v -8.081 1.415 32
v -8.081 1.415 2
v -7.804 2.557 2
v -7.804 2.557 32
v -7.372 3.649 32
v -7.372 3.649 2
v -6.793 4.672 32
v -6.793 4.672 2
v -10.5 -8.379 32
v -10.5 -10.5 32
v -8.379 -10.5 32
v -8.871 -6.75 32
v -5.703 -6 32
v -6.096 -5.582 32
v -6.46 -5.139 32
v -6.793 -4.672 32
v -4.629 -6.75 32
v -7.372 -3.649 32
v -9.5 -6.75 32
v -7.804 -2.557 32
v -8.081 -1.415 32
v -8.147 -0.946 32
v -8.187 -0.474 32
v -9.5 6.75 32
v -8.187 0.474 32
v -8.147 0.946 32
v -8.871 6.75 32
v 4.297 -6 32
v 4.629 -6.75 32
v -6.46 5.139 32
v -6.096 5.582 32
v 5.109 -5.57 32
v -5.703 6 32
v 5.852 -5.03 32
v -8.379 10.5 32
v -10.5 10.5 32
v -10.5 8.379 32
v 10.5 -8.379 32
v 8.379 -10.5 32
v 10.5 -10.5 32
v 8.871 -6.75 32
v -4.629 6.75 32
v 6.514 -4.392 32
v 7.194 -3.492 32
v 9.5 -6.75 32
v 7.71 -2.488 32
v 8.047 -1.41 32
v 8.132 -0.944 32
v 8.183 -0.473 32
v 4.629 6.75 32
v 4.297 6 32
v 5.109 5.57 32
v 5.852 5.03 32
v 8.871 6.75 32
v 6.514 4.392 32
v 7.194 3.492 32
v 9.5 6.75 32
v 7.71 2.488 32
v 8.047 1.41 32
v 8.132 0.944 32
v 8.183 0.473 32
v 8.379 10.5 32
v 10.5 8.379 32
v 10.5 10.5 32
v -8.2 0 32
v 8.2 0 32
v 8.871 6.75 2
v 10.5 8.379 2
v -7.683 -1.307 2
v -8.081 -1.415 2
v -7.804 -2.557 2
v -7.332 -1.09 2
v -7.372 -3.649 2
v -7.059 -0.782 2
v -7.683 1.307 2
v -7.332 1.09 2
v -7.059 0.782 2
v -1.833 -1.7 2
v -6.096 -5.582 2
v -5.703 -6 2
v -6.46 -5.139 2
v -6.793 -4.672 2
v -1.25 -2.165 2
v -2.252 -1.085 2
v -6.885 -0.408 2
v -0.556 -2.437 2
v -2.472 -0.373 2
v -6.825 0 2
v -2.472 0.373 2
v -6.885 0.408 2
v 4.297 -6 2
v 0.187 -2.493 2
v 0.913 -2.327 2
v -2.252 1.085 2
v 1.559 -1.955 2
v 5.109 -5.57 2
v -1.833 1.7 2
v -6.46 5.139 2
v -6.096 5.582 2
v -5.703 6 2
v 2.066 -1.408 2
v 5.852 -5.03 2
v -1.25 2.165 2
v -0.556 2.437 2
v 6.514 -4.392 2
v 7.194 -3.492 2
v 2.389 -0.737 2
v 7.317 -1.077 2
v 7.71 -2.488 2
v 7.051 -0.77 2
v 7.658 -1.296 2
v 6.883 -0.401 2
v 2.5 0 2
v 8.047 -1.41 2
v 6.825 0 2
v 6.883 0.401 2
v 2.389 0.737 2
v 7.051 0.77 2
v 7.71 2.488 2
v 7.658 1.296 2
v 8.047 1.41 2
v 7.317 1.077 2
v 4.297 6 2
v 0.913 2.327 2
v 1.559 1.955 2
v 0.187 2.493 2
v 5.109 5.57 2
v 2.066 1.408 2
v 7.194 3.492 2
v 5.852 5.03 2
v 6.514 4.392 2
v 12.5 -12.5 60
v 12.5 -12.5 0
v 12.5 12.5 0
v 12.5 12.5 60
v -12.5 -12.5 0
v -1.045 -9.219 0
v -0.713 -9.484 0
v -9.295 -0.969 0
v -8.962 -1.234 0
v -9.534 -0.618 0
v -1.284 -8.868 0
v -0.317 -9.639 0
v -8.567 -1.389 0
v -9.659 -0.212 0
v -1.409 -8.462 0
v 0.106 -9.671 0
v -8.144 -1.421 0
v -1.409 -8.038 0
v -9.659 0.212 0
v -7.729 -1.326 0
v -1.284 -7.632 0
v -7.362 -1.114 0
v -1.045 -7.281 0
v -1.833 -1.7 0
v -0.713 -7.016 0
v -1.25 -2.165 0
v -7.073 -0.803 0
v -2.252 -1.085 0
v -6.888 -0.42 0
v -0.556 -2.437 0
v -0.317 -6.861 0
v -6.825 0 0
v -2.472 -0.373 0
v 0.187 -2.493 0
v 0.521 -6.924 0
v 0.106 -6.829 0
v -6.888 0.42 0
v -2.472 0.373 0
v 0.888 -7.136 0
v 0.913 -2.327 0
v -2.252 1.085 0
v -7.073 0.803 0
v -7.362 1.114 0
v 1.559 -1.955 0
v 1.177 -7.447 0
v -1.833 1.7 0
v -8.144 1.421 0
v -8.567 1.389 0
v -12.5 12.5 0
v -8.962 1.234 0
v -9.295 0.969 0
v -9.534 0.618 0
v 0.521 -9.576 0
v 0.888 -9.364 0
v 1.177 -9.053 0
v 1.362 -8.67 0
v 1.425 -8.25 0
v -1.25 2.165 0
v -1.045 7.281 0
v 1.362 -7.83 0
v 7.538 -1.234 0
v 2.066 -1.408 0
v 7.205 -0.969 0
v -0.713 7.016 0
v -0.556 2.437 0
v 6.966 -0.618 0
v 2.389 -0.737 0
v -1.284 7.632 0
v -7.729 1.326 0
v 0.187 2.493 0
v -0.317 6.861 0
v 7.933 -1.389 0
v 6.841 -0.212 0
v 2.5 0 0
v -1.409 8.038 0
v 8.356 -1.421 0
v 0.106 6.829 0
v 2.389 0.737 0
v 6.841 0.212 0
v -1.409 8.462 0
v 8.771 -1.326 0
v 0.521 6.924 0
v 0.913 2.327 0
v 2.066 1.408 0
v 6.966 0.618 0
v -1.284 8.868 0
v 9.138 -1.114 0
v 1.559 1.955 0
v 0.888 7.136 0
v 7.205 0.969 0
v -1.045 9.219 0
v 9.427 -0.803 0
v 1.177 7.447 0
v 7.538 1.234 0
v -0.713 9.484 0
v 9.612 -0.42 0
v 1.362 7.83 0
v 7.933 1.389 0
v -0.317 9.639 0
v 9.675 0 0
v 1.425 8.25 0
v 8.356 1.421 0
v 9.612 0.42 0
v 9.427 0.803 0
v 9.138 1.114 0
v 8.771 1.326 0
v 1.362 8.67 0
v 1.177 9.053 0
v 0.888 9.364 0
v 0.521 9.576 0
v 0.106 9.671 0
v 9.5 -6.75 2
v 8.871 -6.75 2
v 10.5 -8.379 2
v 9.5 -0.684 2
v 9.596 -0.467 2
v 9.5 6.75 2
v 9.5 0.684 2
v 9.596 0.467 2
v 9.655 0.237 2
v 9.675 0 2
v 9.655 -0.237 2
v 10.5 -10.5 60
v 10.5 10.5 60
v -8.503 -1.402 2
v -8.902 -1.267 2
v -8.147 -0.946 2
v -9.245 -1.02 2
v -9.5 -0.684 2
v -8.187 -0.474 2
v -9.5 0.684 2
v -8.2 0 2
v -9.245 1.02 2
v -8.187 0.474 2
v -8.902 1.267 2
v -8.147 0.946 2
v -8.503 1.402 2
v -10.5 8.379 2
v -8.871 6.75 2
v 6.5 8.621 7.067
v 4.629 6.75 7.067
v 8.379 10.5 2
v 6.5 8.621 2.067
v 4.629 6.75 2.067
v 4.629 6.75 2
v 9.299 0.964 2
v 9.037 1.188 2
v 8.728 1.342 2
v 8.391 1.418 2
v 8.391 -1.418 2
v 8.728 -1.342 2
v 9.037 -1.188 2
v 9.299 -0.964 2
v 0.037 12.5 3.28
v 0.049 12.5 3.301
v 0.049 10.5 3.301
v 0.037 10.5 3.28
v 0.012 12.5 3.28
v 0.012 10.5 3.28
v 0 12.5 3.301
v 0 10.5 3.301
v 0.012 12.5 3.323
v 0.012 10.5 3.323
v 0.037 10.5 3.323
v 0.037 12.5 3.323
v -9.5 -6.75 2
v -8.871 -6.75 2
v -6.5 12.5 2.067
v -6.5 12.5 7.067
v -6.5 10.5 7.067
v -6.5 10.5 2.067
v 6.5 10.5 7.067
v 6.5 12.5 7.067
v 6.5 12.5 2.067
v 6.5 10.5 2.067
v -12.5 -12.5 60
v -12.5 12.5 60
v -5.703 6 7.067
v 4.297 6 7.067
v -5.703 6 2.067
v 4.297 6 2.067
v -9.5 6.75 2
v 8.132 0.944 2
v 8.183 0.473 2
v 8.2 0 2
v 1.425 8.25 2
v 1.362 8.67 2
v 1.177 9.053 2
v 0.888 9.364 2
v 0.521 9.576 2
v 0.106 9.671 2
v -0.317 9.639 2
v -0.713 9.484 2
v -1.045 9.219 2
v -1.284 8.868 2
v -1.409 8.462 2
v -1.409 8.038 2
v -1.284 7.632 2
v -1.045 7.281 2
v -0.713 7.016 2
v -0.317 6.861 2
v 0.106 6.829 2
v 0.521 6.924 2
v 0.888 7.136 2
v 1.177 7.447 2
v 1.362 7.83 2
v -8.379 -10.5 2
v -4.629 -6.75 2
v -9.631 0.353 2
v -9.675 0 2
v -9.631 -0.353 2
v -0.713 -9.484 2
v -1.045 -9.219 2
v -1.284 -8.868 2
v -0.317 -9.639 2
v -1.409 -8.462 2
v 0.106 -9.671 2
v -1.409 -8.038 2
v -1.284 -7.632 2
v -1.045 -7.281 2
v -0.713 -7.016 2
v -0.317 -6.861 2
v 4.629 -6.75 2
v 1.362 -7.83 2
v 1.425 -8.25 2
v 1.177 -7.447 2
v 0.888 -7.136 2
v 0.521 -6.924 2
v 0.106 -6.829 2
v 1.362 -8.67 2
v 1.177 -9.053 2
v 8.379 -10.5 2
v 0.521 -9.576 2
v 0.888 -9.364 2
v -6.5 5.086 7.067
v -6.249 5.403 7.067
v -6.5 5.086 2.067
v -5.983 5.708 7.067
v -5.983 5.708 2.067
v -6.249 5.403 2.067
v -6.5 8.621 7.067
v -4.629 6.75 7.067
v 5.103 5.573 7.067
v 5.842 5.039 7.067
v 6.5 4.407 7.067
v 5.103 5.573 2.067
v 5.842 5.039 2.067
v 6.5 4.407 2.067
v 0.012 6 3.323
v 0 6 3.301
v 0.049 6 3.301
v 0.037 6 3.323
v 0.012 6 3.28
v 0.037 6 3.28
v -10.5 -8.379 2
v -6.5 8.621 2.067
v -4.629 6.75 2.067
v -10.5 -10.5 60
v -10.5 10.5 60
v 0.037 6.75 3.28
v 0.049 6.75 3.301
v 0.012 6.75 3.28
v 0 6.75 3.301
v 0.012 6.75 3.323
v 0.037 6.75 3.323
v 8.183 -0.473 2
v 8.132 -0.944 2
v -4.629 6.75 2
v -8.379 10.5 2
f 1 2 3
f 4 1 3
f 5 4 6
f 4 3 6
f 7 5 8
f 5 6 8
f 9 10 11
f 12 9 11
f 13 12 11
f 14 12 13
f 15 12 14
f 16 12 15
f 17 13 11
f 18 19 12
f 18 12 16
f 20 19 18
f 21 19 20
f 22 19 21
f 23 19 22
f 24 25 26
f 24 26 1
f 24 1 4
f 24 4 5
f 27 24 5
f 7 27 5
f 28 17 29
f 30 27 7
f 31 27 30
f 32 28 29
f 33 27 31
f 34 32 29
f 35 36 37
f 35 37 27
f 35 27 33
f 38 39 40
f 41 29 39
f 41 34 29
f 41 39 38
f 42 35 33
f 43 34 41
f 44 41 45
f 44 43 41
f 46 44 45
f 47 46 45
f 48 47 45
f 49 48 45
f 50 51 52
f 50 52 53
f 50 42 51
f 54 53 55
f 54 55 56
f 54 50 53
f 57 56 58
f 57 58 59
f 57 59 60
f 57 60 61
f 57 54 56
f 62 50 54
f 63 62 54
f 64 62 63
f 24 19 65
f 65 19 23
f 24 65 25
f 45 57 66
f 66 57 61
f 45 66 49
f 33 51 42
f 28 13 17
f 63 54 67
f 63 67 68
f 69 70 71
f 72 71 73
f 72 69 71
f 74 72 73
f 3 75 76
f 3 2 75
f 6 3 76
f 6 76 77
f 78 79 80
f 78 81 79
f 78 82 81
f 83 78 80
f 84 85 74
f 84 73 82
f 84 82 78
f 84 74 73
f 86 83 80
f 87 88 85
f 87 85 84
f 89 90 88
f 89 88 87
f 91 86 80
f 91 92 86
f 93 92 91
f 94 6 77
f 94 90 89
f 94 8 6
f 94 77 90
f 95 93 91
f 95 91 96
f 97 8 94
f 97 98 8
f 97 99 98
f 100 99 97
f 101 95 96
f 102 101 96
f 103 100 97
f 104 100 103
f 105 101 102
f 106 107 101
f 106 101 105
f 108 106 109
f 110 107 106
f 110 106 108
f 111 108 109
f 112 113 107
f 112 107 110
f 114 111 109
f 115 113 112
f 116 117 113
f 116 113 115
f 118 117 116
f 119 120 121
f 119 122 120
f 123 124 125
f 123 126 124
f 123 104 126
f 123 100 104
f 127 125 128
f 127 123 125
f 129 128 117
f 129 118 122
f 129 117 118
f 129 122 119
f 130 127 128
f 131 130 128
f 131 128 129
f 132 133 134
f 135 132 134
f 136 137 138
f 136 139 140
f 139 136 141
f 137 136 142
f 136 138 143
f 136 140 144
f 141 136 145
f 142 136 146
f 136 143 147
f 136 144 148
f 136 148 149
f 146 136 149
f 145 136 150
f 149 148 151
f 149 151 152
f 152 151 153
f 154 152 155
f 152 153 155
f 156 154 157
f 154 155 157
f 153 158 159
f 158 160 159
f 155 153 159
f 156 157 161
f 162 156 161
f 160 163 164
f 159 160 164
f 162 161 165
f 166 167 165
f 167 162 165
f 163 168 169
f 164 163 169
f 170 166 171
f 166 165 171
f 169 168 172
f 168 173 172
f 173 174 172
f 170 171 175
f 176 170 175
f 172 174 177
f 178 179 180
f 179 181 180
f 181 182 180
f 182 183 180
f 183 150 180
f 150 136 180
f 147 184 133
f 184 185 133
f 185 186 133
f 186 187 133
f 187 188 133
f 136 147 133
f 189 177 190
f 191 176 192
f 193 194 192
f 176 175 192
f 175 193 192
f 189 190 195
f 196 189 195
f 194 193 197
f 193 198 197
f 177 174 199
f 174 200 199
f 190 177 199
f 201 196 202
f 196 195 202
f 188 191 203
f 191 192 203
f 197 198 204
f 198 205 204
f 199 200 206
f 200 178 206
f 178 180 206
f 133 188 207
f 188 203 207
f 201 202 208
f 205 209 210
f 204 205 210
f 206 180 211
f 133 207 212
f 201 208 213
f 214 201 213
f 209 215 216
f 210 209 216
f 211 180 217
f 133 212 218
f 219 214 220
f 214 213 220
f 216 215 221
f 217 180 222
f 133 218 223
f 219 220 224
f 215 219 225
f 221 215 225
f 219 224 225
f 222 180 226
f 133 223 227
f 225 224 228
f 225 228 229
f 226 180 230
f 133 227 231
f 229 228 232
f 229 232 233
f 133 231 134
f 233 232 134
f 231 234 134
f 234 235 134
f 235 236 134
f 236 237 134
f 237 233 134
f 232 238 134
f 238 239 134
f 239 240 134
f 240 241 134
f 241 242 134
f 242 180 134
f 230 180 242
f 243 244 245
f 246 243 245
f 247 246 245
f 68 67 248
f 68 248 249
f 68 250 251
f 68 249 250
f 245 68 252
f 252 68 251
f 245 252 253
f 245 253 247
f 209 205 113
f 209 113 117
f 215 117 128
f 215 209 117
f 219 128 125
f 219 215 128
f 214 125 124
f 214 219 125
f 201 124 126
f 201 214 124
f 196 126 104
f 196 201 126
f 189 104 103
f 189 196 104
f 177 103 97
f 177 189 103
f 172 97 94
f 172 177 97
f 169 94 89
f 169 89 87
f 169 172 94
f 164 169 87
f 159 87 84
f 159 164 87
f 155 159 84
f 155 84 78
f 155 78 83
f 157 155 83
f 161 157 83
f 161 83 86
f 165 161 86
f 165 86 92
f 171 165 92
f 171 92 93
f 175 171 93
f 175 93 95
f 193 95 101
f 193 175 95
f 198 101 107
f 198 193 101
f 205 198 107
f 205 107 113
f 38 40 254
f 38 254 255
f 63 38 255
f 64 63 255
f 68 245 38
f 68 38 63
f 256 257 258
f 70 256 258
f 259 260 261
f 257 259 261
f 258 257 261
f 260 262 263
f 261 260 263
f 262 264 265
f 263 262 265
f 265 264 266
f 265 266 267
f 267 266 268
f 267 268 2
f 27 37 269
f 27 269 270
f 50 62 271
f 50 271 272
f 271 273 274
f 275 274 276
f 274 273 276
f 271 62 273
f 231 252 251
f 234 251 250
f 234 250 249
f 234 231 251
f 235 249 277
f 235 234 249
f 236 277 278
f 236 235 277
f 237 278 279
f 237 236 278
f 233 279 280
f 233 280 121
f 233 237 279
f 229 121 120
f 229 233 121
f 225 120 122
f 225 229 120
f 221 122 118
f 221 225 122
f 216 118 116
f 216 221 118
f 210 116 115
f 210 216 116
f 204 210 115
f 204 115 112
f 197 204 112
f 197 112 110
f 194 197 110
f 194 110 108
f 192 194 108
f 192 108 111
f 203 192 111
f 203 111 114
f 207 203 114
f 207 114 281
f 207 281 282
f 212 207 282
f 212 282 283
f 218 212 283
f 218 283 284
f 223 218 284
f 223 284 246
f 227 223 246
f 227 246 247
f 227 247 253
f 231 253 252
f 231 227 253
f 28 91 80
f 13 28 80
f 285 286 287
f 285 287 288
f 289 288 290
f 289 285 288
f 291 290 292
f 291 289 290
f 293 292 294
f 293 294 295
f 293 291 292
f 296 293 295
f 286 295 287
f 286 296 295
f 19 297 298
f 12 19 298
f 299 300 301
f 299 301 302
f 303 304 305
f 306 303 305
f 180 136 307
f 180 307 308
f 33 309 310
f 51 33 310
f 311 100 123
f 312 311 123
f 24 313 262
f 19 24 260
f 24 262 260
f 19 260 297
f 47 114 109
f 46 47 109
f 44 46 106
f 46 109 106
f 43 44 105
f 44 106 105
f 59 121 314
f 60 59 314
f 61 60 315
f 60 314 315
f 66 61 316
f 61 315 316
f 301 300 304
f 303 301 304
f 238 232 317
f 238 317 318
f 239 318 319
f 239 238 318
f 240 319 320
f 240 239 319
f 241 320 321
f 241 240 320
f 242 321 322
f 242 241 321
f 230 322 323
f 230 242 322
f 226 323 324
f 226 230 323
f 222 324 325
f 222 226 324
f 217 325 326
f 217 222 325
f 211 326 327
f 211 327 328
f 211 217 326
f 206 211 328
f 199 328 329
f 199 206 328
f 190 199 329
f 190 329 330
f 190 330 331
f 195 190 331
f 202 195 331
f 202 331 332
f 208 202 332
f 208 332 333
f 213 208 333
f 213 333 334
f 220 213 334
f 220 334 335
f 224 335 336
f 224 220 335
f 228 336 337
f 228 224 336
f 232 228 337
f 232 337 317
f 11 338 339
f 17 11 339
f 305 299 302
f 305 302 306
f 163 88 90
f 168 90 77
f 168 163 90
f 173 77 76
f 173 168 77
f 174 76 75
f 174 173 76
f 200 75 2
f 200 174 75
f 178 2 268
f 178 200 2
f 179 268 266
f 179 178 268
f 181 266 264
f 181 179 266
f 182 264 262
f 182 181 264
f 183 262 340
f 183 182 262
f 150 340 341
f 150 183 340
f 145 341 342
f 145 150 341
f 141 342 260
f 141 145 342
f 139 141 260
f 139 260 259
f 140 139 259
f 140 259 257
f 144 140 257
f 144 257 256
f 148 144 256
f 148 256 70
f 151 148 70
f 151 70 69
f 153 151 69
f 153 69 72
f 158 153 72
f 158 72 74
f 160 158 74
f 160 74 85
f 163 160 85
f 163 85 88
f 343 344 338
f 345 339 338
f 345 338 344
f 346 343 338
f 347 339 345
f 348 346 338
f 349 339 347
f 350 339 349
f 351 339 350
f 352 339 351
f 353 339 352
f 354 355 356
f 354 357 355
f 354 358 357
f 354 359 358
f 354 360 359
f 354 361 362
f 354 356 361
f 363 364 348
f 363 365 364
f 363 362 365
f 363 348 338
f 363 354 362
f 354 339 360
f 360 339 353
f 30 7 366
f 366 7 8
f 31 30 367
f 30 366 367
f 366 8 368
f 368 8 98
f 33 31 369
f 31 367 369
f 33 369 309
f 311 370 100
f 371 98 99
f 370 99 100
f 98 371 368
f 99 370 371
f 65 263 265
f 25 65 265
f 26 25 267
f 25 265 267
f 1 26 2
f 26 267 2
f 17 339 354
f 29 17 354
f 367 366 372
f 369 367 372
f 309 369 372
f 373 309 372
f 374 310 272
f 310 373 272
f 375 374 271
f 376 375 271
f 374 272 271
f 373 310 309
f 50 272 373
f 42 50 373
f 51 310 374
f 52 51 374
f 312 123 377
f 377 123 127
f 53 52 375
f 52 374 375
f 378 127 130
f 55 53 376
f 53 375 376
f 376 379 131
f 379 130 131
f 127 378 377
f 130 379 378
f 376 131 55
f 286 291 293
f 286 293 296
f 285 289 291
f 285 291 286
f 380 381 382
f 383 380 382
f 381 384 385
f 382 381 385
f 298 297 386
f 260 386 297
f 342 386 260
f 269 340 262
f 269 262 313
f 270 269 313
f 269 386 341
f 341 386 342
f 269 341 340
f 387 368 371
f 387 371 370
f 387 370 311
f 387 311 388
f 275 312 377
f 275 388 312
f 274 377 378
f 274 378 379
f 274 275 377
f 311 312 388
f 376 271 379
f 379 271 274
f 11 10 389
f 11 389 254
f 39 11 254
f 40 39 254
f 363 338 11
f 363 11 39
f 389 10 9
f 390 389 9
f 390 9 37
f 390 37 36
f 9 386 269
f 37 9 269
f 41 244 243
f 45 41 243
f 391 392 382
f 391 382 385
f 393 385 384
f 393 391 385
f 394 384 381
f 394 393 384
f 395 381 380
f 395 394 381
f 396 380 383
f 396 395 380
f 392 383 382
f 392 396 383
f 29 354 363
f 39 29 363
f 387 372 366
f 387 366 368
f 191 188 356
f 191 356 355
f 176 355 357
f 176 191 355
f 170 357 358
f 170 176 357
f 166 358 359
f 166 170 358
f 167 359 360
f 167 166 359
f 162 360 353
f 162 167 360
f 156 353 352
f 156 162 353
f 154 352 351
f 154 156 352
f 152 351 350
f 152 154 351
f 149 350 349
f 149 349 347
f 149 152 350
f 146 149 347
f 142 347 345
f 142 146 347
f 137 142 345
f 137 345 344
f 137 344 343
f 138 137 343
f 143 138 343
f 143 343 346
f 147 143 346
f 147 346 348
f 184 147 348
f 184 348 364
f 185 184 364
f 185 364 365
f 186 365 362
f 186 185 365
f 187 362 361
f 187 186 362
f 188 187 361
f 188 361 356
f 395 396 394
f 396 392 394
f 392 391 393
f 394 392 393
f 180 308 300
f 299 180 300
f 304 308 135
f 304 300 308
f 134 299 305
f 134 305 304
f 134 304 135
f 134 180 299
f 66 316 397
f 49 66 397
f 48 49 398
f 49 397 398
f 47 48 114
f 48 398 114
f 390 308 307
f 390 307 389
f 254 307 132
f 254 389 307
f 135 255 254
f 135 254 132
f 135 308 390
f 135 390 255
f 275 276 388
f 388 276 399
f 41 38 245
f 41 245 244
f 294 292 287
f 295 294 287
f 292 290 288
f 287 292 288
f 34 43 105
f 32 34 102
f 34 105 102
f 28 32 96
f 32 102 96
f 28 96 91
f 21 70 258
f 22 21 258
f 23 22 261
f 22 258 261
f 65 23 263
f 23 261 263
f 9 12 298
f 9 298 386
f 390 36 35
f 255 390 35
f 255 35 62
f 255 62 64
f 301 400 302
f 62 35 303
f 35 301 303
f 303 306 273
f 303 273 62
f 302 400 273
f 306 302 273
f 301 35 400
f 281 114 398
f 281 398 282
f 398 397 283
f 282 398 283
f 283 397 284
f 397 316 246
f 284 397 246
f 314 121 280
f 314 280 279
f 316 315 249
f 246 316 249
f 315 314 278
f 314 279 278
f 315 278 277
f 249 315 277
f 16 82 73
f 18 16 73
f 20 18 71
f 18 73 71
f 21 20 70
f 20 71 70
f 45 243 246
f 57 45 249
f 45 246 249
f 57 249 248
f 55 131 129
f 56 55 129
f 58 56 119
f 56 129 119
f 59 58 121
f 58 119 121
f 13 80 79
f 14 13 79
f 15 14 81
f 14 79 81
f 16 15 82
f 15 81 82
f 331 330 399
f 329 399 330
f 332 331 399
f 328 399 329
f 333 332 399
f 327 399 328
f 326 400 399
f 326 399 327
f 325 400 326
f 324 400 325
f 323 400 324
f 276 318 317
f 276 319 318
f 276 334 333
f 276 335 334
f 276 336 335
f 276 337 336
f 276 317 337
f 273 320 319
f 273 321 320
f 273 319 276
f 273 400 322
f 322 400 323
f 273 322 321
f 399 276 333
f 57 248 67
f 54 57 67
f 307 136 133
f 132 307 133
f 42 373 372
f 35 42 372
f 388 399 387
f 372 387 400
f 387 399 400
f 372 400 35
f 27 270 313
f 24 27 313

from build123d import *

# Parameters (mm, degrees)
SKETCH1_W           = 25
SKETCH1_H           = 25
BOSS_EXTRUDE1_DEPTH = 60
SHELL1_T            = -2
SKETCH2_R           = 2.5
SKETCH2_R_2         = 1.425
CUT_EXTRUDE4_DEPTH  = 2
BOSS_EXTRUDE3_DEPTH = 30
SKETCH5_W           = 13
SKETCH5_H           = 5
SKETCH5_R           = 0.024622166
CUT_EXTRUDE6_DEPTH  = 10


with BuildPart() as part:
    # Sketch1 → Boss-Extrude1 (new body)
    with BuildSketch(Plane.XY):
        Rectangle(SKETCH1_W, SKETCH1_H)
    extrude(amount=BOSS_EXTRUDE1_DEPTH)

    # Shell1
    shell1_openings = [part.faces().sort_by_distance(p)[0] for p in [
        (0, 0, 60),
    ]]
    offset(amount=SHELL1_T, openings=shell1_openings, kind=Kind.INTERSECTION)

    # Sketch2 → Cut-Extrude4 (cut)
    with BuildSketch(Plane.XY):
        Circle(SKETCH2_R)
        with Locations((8.25, 0)):
            Circle(SKETCH2_R_2)
        with Locations((0, -8.25)):
            Circle(SKETCH2_R_2)
        with Locations((-8.25, 0)):
            Circle(SKETCH2_R_2)
        with Locations((0, 8.25)):
            Circle(SKETCH2_R_2)
    extrude(amount=CUT_EXTRUDE4_DEPTH, mode=Mode.SUBTRACT)

    # Sketch4 → Boss-Extrude3 (add)
    with BuildSketch(Plane.XY.offset(2)):
        with BuildLine():
            Line((-8.871320344, 6.75), (-6.792832126, 4.671511782))
            ThreePointArc((-6.792832126, 4.671511782), (-6.28187766, 5.363494358), (-5.703280287, 6))
            Line((-5.703280287, 6), (-3.878679656, 6))
            Line((-3.878679656, 6), (-4.628679656, 6.75))
            Line((-4.628679656, 6.75), (-8.871320344, 6.75))
        make_face()
        Polygon((-10.5, 8.378679656), (-8.871320344, 6.75), (-4.628679656, 6.75), (-8.378679656, 10.5), (-10.5, 10.5), align=None)
        Polygon((-3.878679656, 6), (0, 6), (3.878679656, 6), (4.628679656, 6.75), (-4.628679656, 6.75), align=None)
        Polygon((8.378679656, 10.5), (4.628679656, 6.75), (8.871320344, 6.75), (10.5, 8.378679656), (10.5, 10.5), align=None)
        with BuildLine():
            Line((4.628679656, 6.75), (3.878679656, 6))
            Line((3.878679656, 6), (4.296719713, 6))
            ThreePointArc((4.296719713, 6), (5.489948643, 5.313054416), (6.513606116, 4.392285772))
            Line((6.513606116, 4.392285772), (8.871320344, 6.75))
            Line((8.871320344, 6.75), (4.628679656, 6.75))
        make_face()
        with BuildLine():
            ThreePointArc((-5.703280287, -6), (-6.28187766, -5.363494358), (-6.792832126, -4.671511782))
            Line((-6.792832126, -4.671511782), (-8.871320344, -6.75))
            Line((-8.871320344, -6.75), (-4.628679656, -6.75))
            Line((-4.628679656, -6.75), (-3.878679656, -6))
            Line((-3.878679656, -6), (-5.703280287, -6))
        make_face()
        with BuildLine():
            Line((4.296719713, -6), (3.878679656, -6))
            Line((3.878679656, -6), (4.628679656, -6.75))
            Line((4.628679656, -6.75), (8.871320344, -6.75))
            Line((8.871320344, -6.75), (6.513606116, -4.392285772))
            ThreePointArc((6.513606116, -4.392285772), (5.489948643, -5.313054416), (4.296719713, -6))
        make_face()
        Polygon((-4.628679656, -6.75), (-8.871320344, -6.75), (-10.5, -8.378679656), (-10.5, -10.5), (-8.378679656, -10.5), align=None)
        Polygon((8.871320344, -6.75), (4.628679656, -6.75), (8.378679656, -10.5), (10.5, -10.5), (10.5, -8.378679656), align=None)
        with BuildLine():
            Line((8.871320344, 6.75), (6.513606116, 4.392285772))
            ThreePointArc((6.513606116, 4.392285772), (7.473760778, 3.000900651), (8.046659593, 1.410417555))
            ThreePointArc((8.046659593, 1.410417555), (8.886964121, 1.274716325), (9.5, 0.684196609))
            Line((9.5, 0.684196609), (9.5, 6.75))
            Line((9.5, 6.75), (8.871320344, 6.75))
        make_face()
        with BuildLine():
            ThreePointArc((8.046659593, -1.410417555), (7.473760778, -3.000900651), (6.513606116, -4.392285772))
            Line((6.513606116, -4.392285772), (8.871320344, -6.75))
            Line((8.871320344, -6.75), (9.5, -6.75))
            Line((9.5, -6.75), (9.5, -0.684196609))
            ThreePointArc((9.5, -0.684196609), (8.886964121, -1.274716325), (8.046659593, -1.410417555))
        make_face()
        Polygon((3.878679656, -6), (0, -6), (-3.878679656, -6), (-4.628679656, -6.75), (4.628679656, -6.75), align=None)
        with BuildLine():
            ThreePointArc((-6.792832126, -4.671511782), (-7.607218745, -3.110608316), (-8.080808179, -1.414920184))
            ThreePointArc((-8.080808179, -1.414920184), (-8.902323398, -1.26692509), (-9.5, -0.684196609))
            Line((-9.5, -0.684196609), (-9.5, -6.75))
            Line((-9.5, -6.75), (-8.871320344, -6.75))
            Line((-8.871320344, -6.75), (-6.792832126, -4.671511782))
        make_face()
        with BuildLine():
            ThreePointArc((-9.5, 0.684196609), (-8.902323398, 1.26692509), (-8.080808179, 1.414920184))
            ThreePointArc((-8.080808179, 1.414920184), (-7.607218745, 3.110608316), (-6.792832126, 4.671511782))
            Line((-6.792832126, 4.671511782), (-8.871320344, 6.75))
            Line((-8.871320344, 6.75), (-9.5, 6.75))
            Line((-9.5, 6.75), (-9.5, 0.684196609))
        make_face()
        with BuildLine():
            ThreePointArc((-8.080808179, -1.414920184), (-8.170149368, -0.709965812), (-8.2, 0))
            ThreePointArc((-8.2, 0), (-8.170149368, 0.709965812), (-8.080808179, 1.414920184))
            ThreePointArc((-8.080808179, 1.414920184), (-8.902323398, 1.26692509), (-9.5, 0.684196609))
            Line((-9.5, 0.684196609), (-9.5, -0.684196609))
            ThreePointArc((-9.5, -0.684196609), (-8.902323398, -1.26692509), (-8.080808179, -1.414920184))
        make_face()
        with BuildLine():
            ThreePointArc((8.046659593, 1.410417555), (8.161552283, 0.709364321), (8.2, 0))
            ThreePointArc((8.2, 0), (8.161552283, -0.709364321), (8.046659593, -1.410417555))
            ThreePointArc((8.046659593, -1.410417555), (8.886964121, -1.274716325), (9.5, -0.684196609))
            Line((9.5, -0.684196609), (9.5, 0.684196609))
            ThreePointArc((9.5, 0.684196609), (8.886964121, 1.274716325), (8.046659593, 1.410417555))
        make_face()
    extrude(amount=BOSS_EXTRUDE3_DEPTH)

    # Sketch5 → Cut-Extrude6 (cut)
    with BuildSketch(Plane(origin=(0, 12.5, 0), x_dir=(1, 0, 0), z_dir=(0, 1, 0))):
        with Locations((0, -4.566766708)):
            Rectangle(SKETCH5_W, SKETCH5_H)
        with Locations((0.024622166, -3.301323142)):
            Circle(SKETCH5_R, mode=Mode.SUBTRACT)
    extrude(amount=-CUT_EXTRUDE6_DEPTH, mode=Mode.SUBTRACT)


solid = part.part
